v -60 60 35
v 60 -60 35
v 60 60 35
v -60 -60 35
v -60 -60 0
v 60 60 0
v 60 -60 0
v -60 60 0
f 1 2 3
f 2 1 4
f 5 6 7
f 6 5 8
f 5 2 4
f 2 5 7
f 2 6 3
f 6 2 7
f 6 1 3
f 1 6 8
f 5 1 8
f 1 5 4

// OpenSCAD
// 3D model representing the reservoir assembly.
// This includes the acrylic reservoir, the water pump, and the solid fixtures attached to the reservoir.

$fn=256;

reservoir_size = [120, 120, 35];

module reservoir_assy_3d() {
    module reservoir_block() {
        cube(reservoir_size, center = true);
    }

    translate([0, 0, reservoir_size[2] / 2])
    reservoir_block();
}

reservoir_assy_3d();
